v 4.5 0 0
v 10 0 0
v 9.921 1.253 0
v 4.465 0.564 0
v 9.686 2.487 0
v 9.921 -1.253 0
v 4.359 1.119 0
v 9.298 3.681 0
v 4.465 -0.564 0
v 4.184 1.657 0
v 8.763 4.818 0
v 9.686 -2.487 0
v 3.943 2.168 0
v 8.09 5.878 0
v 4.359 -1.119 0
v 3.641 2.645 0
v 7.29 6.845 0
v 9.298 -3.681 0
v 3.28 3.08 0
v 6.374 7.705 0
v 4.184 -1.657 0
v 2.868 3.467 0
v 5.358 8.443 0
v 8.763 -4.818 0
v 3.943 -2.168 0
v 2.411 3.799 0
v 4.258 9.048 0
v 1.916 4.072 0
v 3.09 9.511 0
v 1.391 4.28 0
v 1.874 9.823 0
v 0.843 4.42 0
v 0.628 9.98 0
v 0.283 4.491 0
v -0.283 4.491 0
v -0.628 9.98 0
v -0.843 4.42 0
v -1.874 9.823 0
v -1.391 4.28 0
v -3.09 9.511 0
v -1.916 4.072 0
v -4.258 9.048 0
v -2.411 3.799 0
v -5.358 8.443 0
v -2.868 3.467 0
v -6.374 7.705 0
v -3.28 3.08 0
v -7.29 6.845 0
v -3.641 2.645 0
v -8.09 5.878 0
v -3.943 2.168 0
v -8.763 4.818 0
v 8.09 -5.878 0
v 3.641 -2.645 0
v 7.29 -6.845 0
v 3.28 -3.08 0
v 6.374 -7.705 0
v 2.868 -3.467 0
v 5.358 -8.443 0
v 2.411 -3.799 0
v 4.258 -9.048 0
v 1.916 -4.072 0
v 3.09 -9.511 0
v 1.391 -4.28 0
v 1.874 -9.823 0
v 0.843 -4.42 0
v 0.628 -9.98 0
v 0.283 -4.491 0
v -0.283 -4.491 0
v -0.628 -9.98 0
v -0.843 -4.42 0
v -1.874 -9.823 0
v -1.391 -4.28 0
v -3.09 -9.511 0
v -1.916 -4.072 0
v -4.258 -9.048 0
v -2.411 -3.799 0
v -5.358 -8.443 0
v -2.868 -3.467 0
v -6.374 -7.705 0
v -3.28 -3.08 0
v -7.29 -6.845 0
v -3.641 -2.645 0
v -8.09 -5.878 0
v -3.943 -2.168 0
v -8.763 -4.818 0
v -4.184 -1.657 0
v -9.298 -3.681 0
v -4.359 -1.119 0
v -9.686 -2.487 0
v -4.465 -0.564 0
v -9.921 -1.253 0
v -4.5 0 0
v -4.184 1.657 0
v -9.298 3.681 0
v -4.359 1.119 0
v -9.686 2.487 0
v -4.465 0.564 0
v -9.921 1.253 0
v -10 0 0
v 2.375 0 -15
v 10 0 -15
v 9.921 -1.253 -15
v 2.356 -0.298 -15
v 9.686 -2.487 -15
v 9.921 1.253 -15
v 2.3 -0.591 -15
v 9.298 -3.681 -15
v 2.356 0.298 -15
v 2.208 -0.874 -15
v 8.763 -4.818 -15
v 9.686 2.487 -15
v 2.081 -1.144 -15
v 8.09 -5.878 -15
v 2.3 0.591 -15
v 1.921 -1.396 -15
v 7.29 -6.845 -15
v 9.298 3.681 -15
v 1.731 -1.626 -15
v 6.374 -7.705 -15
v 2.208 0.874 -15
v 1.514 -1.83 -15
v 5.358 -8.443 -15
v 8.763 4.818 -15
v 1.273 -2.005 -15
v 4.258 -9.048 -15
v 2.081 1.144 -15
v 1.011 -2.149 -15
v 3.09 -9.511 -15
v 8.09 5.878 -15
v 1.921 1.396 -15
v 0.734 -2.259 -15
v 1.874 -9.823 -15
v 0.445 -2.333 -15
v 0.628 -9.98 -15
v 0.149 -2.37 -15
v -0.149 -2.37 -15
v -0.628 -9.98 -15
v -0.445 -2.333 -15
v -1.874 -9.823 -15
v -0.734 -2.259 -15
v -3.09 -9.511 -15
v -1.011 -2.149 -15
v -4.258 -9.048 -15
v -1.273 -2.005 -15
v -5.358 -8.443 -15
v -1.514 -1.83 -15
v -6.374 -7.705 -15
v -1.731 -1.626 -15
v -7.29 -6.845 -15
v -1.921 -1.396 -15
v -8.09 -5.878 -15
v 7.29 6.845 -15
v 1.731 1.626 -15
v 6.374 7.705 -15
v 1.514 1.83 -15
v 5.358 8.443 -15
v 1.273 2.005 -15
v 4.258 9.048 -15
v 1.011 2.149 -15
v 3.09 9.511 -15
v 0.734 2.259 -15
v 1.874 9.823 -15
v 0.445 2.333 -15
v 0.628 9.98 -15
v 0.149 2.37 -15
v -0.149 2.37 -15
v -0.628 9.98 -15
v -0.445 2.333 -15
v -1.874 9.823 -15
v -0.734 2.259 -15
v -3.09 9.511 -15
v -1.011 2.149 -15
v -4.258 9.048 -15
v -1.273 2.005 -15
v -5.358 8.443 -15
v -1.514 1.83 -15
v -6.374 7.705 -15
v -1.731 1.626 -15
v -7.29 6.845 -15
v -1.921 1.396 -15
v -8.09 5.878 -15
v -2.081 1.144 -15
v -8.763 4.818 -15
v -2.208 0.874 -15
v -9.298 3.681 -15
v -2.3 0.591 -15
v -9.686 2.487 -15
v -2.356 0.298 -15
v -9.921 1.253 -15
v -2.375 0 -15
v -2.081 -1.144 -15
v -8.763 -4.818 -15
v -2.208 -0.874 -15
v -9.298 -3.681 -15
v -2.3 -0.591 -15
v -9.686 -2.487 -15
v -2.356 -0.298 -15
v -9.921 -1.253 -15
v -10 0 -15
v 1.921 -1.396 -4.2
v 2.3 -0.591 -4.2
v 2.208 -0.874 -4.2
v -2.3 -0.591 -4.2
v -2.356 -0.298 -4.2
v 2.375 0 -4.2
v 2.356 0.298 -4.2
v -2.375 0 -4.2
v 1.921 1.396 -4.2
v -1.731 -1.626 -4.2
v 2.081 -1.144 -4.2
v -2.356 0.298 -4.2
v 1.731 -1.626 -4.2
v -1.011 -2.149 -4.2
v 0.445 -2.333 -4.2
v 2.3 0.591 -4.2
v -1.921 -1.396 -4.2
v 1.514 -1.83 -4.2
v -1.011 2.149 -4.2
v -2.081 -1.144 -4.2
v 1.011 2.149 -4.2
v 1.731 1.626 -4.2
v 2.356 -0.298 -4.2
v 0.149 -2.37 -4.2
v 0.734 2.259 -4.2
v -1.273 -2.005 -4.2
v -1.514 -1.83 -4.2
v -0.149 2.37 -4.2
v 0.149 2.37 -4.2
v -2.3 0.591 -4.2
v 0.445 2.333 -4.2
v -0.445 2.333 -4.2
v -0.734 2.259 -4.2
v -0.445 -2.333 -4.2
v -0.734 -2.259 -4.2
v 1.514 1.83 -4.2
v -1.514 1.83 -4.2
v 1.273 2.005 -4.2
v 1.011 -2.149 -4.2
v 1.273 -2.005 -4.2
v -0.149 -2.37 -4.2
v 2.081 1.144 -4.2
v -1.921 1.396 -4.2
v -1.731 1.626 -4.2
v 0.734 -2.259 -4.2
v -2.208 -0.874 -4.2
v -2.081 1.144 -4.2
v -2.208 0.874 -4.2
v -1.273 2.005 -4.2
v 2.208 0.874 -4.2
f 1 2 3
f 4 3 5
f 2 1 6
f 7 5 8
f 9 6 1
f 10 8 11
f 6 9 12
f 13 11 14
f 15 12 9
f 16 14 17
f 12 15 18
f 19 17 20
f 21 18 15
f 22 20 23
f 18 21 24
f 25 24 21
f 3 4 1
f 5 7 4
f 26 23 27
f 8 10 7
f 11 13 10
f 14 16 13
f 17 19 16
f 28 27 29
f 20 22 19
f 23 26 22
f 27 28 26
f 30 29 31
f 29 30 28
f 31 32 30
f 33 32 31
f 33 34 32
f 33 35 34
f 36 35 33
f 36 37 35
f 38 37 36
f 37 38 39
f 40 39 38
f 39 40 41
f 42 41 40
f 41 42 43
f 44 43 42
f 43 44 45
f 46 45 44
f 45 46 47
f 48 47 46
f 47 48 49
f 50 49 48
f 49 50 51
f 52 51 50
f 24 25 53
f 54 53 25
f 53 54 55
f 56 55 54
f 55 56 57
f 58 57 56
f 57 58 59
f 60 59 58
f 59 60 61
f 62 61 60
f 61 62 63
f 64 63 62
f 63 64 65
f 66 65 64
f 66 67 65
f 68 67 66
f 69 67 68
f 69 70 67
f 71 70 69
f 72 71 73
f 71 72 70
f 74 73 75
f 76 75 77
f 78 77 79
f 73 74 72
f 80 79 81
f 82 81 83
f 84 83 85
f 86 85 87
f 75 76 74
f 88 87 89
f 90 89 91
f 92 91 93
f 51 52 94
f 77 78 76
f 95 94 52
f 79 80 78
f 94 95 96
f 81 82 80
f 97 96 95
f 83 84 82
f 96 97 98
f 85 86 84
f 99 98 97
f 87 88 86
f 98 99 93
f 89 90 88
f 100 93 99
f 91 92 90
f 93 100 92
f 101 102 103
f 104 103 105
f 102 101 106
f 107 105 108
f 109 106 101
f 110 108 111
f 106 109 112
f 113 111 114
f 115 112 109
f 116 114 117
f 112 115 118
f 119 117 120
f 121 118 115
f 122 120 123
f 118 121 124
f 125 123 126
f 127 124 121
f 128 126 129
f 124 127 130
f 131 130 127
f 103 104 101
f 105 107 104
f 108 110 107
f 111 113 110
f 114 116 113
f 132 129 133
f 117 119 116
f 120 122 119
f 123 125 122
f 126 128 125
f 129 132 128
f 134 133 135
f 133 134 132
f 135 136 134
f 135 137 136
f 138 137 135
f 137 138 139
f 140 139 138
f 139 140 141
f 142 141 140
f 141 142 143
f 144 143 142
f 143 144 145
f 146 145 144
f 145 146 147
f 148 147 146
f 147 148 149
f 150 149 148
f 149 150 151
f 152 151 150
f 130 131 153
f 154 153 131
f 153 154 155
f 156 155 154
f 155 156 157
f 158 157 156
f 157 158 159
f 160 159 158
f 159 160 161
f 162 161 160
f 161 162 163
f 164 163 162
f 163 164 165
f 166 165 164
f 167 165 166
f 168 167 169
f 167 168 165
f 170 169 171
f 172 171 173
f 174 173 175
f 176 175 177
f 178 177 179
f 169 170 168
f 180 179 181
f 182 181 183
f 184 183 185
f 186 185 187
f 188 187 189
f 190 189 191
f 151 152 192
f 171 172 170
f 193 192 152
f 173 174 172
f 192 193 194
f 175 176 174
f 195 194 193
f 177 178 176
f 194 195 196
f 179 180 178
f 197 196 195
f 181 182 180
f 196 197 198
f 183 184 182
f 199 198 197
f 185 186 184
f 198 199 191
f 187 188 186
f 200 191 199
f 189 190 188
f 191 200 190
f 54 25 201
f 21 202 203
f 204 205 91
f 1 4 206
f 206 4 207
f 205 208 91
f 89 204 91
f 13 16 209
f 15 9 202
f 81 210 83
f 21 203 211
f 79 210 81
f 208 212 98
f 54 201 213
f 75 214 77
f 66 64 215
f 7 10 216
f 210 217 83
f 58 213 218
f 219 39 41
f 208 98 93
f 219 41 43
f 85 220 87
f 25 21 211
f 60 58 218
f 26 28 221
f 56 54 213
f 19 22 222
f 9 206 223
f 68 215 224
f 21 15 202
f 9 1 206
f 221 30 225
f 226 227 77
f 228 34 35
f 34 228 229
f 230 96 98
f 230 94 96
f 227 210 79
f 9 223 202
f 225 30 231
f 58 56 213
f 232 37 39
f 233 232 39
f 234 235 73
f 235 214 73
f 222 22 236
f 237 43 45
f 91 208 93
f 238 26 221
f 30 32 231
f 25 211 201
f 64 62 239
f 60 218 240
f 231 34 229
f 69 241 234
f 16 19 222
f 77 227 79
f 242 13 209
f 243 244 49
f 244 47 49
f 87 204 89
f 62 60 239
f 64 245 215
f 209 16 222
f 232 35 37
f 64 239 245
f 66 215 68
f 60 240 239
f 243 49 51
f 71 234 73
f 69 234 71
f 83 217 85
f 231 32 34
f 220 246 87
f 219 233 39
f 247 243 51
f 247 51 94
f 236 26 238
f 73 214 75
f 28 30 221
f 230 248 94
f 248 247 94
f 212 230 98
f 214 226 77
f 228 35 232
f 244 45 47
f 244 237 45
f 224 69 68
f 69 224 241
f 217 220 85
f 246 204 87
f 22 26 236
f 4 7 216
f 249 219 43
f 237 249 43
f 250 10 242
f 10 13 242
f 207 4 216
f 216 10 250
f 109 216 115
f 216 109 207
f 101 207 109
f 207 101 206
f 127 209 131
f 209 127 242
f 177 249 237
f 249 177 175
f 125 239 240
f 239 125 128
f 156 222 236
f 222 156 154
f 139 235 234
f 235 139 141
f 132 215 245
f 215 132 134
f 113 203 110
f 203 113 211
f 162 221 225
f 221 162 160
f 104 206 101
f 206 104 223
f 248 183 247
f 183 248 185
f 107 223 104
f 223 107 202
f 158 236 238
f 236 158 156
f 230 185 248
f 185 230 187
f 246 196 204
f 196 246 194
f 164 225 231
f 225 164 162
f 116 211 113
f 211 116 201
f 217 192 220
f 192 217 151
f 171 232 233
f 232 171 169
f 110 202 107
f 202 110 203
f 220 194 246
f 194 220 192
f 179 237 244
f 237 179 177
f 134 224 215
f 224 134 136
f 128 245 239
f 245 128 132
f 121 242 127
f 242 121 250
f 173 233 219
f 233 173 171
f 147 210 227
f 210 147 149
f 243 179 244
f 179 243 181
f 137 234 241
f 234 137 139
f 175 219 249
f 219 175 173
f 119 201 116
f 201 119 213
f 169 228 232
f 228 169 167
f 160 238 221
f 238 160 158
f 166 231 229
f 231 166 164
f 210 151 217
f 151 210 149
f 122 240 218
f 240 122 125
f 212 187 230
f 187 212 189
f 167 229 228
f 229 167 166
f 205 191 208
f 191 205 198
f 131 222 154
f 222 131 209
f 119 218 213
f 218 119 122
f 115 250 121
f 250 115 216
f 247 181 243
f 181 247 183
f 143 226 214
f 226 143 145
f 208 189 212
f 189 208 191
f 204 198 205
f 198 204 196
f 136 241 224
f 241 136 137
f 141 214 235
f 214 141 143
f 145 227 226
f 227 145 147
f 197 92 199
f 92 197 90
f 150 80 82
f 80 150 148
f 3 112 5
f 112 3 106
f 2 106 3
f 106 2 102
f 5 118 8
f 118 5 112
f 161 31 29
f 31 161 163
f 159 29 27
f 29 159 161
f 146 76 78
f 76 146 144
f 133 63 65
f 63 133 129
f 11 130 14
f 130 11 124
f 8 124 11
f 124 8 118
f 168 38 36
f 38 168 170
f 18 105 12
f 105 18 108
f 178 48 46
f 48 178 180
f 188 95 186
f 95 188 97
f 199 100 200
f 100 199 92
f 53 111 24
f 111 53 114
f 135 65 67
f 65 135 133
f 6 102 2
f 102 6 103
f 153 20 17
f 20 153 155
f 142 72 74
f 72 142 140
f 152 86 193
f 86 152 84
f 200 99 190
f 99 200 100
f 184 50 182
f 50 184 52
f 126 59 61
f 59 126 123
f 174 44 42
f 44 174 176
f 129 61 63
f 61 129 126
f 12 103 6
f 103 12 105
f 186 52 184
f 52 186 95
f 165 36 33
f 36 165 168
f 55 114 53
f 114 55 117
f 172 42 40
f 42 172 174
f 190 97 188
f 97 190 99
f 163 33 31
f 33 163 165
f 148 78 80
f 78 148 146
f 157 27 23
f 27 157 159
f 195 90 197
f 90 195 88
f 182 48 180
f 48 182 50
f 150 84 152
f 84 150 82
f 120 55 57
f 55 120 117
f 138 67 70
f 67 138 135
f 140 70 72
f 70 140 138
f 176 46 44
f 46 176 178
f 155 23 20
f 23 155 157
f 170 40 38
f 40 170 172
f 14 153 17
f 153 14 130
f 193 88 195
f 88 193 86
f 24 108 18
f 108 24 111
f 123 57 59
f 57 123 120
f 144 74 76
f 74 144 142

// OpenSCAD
$fn = 50;


difference() {
	union() {
		translate(v = [0, 0, -15.0000000000]) {
			cylinder(h = 15, r = 10.0000000000);
		}
		cylinder(h = 0, r = 20.0000000000);
	}
	union() {
		translate(v = [0, 0, 0]) {
			rotate(a = [0, 0, 0]) {
				difference() {
					union() {
						#translate(v = [0, 0, -15.0000000000]) {
							cylinder(h = 15, r = 2.2500000000);
						}
						#translate(v = [0, 0, -4.2000000000]) {
							cylinder(h = 4.2000000000, r = 10.0000000000, r1 = 2.3750000000, r2 = 4.5000000000);
						}
						#translate(v = [0, 0, -15.0000000000]) {
							cylinder(h = 15, r = 2.3750000000);
						}
						#translate(v = [0, 0, -15.0000000000]) {
							cylinder(h = 15, r = 2.2500000000);
						}
					}
					union();
				}
			}
		}
	}
}
